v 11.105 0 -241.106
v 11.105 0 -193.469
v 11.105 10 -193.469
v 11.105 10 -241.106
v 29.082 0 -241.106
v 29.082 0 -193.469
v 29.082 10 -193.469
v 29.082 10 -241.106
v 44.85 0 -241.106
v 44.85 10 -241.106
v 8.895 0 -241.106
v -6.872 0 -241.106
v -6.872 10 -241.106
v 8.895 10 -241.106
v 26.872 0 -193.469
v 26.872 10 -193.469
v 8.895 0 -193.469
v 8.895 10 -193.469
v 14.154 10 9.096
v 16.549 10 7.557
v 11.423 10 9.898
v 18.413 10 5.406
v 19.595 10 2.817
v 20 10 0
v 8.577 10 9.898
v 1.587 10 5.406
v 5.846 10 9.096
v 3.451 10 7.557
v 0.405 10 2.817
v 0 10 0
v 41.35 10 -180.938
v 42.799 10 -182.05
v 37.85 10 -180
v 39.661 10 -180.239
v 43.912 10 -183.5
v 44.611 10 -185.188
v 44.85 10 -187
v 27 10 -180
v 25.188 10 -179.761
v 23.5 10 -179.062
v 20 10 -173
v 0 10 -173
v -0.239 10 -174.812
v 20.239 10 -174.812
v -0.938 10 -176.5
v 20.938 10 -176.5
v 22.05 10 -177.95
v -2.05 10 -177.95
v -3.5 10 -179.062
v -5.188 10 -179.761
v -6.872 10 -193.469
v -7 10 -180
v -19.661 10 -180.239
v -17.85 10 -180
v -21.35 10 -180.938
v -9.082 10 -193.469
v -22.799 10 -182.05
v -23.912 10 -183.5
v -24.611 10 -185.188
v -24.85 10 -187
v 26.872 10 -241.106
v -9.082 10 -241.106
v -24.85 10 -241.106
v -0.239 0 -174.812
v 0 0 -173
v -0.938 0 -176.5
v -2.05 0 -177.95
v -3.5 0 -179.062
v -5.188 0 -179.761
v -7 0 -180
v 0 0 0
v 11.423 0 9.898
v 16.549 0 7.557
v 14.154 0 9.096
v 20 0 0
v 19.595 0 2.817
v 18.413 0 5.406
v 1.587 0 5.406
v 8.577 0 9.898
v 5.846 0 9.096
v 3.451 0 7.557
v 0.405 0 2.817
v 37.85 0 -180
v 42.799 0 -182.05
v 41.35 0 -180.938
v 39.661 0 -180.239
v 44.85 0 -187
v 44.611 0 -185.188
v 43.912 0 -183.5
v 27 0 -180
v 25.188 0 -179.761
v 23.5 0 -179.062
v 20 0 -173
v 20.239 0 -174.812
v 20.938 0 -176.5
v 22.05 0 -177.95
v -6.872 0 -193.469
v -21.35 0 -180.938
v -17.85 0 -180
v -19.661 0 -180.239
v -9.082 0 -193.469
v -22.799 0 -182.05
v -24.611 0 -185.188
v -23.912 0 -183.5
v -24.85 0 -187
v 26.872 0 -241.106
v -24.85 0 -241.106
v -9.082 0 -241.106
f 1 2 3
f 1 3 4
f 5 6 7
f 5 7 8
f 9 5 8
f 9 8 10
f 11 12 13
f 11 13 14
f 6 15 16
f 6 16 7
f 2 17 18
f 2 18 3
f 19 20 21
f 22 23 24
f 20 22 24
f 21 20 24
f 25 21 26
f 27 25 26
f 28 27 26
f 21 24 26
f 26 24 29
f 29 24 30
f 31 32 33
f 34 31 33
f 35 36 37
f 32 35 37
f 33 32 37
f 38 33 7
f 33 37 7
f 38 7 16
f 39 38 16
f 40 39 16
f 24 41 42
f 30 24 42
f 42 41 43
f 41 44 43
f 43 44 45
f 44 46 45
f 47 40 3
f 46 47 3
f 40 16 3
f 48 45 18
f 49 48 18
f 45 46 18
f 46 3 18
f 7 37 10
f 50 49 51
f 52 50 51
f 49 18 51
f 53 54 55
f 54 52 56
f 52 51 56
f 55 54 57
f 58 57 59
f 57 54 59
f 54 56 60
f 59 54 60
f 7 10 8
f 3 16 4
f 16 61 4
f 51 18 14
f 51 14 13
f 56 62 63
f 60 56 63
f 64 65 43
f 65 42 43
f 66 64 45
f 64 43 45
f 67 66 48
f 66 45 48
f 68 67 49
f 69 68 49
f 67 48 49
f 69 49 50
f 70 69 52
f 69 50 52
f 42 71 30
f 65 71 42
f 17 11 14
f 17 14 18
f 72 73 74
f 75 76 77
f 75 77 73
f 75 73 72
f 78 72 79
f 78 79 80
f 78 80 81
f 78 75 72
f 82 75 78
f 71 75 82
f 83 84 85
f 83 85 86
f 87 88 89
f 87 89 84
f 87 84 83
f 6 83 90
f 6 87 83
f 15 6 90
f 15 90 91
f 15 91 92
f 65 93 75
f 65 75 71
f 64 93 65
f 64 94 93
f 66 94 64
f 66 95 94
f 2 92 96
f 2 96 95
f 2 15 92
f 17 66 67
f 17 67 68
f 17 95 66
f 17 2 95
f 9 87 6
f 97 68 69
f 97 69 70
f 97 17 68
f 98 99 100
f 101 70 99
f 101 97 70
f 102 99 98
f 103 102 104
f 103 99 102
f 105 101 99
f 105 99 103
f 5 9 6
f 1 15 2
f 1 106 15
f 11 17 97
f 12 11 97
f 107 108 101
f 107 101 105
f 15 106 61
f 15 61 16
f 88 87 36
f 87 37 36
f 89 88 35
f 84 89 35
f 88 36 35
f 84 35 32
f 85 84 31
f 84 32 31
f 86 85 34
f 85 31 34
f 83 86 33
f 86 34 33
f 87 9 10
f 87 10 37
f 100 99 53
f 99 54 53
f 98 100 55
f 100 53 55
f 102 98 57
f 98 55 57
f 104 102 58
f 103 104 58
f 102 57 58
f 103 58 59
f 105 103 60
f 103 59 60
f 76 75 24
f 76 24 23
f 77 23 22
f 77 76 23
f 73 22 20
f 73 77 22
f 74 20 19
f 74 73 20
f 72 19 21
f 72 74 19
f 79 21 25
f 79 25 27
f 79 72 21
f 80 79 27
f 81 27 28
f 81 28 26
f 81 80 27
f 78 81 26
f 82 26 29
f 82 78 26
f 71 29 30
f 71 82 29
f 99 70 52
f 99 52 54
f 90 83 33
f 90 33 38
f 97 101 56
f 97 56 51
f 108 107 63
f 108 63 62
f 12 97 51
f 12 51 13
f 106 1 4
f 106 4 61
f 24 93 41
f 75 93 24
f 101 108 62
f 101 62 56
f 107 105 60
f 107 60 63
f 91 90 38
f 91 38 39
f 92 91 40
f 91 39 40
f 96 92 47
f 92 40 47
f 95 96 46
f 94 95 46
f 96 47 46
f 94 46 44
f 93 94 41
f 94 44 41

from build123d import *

# Parameters (mm, degrees)
BOSS_EXTRUDE1_DEPTH = 10
FILLET2_R           = 7


with BuildPart() as part:
    # Sketch1 → Boss-Extrude1 (new body)
    with BuildSketch(Plane(origin=(0, 0, 0), x_dir=(1, 0, 0), z_dir=(0, 1, 0))):
        with BuildLine():
            Line((0, 0), (0, 180))
            Line((0, 180), (-24.84953376, 180))
            Line((-24.84953376, 180), (-24.84953376, 241.105739003))
            Line((-24.84953376, 241.105739003), (-9.081721857, 241.105739003))
            Line((-9.081721857, 241.105739003), (-9.081721857, 193.469393381))
            Line((-9.081721857, 193.469393381), (-6.872448555, 193.469393381))
            Line((-6.872448555, 193.469393381), (-6.872448555, 241.105739003))
            Line((-6.872448555, 241.105739003), (8.895363349, 241.105739003))
            Line((8.895363349, 241.105739003), (8.895363349, 193.469393381))
            Line((8.895363349, 193.469393381), (11.104636651, 193.469393381))
            Line((11.104636651, 193.469393381), (11.104636651, 241.105739003))
            Line((11.104636651, 241.105739003), (26.872448555, 241.105739003))
            Line((26.872448555, 241.105739003), (26.872448555, 193.469393381))
            Line((26.872448555, 193.469393381), (29.081721857, 193.469393381))
            Line((29.081721857, 193.469393381), (29.081721857, 241.105739003))
            Line((29.081721857, 241.105739003), (44.84953376, 241.105739003))
            Line((44.84953376, 241.105739003), (44.84953376, 180))
            Line((44.84953376, 180), (20, 180))
            Line((20, 180), (20, 0))
            ThreePointArc((20, 0), (10, -10), (0, 0))
        make_face()
    extrude(amount=BOSS_EXTRUDE1_DEPTH)

    # Fillet2
    fillet2_edges = [part.edges().sort_by_distance(p)[0] for p in [
        (0, 5, -180),
        (-24.84953376, 5, -180),
        (44.84953376, 5, -180),
        (20, 5, -180),
    ]]
    fillet(fillet2_edges, radius=FILLET2_R)


solid = part.part
